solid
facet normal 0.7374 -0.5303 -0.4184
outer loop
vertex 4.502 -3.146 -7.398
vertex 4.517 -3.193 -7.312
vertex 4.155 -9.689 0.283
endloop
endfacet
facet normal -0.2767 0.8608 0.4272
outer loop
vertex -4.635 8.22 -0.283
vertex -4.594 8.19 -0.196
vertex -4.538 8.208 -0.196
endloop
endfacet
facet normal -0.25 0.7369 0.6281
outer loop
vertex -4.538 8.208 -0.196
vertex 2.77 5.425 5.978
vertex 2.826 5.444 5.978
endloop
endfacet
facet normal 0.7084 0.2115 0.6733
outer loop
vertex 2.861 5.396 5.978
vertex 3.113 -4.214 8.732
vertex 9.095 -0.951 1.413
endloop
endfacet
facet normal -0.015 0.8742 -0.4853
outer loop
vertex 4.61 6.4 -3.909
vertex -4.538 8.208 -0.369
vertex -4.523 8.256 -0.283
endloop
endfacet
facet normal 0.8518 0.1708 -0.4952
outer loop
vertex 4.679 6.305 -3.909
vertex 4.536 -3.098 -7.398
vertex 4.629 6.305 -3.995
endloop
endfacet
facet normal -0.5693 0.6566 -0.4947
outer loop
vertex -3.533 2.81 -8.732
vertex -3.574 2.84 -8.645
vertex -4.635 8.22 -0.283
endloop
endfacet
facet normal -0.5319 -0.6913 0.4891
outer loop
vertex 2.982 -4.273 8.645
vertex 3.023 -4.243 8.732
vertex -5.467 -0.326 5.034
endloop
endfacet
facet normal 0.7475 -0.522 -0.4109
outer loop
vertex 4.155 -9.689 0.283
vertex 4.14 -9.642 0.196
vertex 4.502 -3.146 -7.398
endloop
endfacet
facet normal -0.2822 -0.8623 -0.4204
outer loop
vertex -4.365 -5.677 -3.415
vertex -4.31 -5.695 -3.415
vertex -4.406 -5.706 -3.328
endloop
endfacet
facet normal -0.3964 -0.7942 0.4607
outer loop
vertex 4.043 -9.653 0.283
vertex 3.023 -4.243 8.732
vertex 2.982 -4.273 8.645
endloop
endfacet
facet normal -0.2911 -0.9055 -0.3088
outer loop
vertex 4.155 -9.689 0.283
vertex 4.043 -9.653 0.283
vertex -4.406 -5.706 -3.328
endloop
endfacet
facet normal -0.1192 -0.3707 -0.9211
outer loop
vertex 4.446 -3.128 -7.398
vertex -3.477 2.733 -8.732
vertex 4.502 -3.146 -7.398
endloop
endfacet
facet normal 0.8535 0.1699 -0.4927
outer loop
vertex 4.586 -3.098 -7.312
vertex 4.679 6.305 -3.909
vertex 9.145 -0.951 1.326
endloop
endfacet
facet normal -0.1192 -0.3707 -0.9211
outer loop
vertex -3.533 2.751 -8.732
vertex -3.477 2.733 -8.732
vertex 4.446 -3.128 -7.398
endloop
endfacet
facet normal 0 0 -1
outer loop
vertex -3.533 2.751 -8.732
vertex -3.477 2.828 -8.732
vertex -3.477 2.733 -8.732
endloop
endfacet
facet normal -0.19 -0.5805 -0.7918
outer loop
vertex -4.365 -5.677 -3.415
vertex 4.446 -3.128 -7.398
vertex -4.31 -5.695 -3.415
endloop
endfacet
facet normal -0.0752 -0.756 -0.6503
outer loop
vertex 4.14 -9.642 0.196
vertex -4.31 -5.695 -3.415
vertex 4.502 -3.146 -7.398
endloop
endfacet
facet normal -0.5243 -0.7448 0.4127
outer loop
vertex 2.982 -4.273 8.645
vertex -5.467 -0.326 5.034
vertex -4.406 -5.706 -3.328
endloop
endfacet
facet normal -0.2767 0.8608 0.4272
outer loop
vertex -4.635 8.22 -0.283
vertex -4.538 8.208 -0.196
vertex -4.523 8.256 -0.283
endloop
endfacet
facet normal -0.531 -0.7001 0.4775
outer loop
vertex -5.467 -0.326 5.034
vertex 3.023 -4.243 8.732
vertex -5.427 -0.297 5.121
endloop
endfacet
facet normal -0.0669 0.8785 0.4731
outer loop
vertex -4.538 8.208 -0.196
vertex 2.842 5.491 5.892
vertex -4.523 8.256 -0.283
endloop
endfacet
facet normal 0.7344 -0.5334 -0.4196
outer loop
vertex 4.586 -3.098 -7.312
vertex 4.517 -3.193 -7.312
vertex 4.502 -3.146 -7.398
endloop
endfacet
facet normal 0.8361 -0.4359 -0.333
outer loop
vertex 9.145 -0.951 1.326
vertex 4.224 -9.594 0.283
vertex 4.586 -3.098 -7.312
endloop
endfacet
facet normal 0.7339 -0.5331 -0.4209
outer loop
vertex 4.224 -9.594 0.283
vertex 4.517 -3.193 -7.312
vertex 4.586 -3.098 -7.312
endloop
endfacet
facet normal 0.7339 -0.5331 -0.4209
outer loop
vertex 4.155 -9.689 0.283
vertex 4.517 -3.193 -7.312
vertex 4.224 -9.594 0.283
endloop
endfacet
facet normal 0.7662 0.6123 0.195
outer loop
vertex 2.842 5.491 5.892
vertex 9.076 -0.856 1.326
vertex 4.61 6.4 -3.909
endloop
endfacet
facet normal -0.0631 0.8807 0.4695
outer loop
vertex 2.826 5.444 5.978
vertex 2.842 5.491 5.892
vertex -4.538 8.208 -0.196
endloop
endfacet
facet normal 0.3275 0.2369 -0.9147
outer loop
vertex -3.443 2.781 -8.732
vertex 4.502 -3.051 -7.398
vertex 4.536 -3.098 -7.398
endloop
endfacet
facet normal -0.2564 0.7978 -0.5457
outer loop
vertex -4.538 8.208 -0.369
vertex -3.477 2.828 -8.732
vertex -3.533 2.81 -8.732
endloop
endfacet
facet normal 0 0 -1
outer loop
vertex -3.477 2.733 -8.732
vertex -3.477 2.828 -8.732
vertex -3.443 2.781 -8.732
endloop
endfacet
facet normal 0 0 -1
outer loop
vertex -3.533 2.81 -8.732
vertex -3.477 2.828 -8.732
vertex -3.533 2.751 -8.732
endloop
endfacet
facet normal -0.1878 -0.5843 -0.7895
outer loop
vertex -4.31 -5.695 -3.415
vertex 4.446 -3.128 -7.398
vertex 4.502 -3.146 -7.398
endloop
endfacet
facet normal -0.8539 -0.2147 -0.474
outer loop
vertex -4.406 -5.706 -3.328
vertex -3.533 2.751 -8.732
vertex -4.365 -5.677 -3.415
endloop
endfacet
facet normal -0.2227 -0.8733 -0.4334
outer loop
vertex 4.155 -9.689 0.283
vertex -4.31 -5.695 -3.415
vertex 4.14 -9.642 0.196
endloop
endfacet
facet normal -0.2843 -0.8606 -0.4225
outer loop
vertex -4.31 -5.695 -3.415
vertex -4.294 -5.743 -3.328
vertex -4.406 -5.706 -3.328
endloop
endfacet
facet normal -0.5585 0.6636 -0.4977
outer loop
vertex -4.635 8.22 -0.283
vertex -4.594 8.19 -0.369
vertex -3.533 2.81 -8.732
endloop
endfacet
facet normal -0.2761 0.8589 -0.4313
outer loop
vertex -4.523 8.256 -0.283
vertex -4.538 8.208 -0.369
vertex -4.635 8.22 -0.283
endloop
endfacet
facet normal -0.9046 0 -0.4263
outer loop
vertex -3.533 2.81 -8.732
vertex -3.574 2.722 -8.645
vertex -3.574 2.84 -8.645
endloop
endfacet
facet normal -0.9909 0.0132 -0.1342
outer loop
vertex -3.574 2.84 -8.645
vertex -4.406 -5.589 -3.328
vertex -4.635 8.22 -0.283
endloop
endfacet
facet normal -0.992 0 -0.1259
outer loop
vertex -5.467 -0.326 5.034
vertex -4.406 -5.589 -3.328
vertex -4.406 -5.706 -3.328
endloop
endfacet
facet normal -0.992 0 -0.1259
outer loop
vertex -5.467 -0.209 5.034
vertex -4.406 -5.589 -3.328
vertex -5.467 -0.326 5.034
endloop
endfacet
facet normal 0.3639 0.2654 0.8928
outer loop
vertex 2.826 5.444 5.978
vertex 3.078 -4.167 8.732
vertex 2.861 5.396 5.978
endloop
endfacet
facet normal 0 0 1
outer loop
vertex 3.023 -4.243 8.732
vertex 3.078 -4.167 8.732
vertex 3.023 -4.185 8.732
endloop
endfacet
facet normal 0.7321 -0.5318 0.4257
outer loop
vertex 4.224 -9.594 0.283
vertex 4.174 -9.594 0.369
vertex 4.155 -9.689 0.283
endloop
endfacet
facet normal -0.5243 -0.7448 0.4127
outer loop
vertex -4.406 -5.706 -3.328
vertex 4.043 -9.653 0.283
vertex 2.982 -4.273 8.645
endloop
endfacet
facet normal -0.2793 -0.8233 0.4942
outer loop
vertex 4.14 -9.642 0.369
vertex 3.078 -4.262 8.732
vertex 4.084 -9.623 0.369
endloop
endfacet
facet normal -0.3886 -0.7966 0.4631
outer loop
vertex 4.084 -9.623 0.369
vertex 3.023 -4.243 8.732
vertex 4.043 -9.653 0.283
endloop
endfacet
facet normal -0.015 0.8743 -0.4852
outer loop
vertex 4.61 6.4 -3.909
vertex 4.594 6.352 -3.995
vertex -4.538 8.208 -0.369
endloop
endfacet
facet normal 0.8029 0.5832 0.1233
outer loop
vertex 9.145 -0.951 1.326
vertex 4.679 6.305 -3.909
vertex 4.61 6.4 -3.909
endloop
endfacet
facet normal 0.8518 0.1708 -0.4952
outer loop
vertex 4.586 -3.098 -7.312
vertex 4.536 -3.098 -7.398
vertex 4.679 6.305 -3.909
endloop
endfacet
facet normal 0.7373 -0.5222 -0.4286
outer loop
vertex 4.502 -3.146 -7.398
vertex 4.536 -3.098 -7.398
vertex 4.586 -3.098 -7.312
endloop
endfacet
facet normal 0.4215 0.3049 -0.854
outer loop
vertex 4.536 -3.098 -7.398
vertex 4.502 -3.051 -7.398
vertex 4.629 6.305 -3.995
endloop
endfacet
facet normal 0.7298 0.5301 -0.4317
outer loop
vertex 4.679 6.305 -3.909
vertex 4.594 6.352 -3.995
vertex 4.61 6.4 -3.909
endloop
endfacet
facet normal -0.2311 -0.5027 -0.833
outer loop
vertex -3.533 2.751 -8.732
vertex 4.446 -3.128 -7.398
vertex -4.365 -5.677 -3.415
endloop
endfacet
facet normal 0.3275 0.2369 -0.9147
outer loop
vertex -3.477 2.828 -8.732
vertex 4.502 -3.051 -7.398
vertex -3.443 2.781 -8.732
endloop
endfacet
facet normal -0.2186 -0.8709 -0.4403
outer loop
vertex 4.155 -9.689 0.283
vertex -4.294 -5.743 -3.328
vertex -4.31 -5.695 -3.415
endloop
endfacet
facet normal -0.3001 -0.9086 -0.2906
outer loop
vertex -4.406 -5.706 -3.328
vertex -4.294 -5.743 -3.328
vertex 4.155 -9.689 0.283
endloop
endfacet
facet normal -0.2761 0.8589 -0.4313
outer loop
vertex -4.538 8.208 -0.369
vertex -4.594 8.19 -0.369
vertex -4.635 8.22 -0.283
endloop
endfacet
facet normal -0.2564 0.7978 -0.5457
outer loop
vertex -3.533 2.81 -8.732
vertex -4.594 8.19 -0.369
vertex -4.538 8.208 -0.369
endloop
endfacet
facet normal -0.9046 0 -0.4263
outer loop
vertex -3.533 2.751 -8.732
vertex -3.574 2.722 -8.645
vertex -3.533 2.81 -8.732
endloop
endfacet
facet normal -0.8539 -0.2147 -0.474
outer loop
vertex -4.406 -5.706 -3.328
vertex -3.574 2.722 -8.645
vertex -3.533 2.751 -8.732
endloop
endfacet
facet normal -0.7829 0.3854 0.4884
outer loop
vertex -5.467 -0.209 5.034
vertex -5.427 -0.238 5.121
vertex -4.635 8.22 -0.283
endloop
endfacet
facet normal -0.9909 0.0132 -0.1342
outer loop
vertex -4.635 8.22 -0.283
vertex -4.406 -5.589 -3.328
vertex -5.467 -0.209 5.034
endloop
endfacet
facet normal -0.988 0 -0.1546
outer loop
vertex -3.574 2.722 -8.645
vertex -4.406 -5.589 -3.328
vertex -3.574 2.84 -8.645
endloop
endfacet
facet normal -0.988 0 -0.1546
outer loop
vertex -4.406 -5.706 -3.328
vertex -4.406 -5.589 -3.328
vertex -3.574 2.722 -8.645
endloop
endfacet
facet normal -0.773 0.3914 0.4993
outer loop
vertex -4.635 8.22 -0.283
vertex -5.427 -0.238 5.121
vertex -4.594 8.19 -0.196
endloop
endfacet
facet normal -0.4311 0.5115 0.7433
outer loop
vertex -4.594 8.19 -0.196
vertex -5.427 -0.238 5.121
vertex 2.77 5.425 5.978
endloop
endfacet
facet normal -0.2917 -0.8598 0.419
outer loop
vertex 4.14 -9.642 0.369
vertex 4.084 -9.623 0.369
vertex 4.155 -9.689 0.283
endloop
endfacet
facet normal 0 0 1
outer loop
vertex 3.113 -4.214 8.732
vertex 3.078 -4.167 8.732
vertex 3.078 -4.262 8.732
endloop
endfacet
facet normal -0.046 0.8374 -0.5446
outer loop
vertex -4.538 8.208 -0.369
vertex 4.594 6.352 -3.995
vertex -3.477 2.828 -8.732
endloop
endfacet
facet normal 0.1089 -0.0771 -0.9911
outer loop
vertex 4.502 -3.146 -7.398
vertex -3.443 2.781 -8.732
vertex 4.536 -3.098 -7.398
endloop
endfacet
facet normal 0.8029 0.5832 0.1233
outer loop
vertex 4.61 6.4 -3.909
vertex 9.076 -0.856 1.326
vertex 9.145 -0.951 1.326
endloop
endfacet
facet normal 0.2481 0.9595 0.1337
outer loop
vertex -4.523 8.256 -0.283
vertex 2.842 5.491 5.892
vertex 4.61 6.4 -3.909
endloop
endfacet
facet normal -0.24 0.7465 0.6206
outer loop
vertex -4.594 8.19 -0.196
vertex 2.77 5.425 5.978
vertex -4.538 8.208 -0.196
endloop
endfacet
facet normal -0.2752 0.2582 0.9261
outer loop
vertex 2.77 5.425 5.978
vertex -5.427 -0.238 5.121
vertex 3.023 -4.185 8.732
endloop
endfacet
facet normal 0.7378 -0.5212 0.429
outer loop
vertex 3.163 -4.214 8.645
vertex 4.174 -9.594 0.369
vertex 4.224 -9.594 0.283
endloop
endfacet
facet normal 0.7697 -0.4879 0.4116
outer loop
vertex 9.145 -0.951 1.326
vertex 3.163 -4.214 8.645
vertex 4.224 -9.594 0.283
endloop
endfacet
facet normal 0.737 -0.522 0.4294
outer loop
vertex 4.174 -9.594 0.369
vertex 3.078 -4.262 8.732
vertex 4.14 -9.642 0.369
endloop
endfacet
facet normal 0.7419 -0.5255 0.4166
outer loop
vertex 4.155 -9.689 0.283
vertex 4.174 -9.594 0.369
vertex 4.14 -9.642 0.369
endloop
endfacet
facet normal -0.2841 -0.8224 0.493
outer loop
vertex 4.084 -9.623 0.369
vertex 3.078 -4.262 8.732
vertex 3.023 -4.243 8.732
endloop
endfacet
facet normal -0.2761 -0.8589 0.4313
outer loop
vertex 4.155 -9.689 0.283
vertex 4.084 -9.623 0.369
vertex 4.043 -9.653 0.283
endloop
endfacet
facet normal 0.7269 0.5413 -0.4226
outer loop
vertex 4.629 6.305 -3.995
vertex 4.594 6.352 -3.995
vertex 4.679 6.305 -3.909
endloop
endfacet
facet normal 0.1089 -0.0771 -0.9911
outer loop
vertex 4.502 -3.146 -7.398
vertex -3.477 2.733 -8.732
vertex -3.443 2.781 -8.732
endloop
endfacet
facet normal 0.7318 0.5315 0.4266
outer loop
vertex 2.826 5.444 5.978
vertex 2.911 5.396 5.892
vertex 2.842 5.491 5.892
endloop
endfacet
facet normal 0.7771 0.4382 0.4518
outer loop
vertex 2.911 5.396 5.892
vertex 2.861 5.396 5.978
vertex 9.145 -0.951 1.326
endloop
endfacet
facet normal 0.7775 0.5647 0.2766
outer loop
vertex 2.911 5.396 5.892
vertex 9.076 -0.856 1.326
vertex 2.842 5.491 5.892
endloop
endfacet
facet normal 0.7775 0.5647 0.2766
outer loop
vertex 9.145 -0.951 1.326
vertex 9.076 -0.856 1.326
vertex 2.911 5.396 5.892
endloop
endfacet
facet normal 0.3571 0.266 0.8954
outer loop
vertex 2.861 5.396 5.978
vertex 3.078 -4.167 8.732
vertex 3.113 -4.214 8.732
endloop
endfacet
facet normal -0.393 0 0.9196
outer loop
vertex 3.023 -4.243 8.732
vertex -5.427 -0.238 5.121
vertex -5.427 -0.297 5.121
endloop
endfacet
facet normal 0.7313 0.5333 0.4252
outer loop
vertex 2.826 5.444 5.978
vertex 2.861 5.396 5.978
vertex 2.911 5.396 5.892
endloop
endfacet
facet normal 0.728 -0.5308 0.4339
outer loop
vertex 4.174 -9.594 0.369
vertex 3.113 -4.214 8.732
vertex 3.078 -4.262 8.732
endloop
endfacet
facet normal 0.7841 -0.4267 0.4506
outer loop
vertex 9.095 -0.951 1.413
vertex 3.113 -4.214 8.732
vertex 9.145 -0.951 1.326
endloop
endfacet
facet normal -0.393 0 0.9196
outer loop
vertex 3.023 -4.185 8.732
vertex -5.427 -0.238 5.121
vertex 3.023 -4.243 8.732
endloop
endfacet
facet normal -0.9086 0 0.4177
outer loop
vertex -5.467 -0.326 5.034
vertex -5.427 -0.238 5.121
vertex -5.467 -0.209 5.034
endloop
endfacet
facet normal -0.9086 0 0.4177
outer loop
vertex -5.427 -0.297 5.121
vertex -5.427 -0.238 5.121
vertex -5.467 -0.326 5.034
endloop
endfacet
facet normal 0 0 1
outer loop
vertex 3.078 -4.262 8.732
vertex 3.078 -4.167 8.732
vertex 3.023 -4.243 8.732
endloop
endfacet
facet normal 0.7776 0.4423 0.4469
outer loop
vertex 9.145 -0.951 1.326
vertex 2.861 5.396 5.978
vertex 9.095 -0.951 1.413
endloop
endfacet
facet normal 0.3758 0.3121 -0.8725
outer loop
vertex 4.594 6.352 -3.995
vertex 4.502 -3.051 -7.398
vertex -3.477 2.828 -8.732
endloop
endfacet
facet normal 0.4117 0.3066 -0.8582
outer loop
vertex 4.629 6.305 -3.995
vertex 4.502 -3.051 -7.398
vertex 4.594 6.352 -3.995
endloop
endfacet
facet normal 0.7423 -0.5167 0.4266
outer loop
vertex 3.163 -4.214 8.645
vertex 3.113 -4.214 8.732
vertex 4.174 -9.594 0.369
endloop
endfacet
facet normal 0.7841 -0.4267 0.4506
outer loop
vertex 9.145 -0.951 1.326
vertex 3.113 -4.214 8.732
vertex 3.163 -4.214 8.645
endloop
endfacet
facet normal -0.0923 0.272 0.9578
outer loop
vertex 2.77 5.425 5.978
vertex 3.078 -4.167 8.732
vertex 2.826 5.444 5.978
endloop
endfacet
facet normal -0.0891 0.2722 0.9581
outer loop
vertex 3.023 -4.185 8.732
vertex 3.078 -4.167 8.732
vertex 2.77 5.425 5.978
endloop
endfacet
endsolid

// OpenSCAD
// Auto-generated OpenSCAD file

    inner_points = 10*[[-0.4553770683985672, 0.816075390462194, -0.02826725120202972], [-0.3492651290097586, 0.27808264626453244, -0.8645112727111914], [0.3062996757811438, -0.4214091552352098, 0.8645112727111914], [0.4124116151699524, -0.9594018994328712, 0.02826725120202972], [0.45789115536956515, 0.630471121507822, -0.3908857929250278], [0.9045034915748815, -0.09513310390029023, 0.13259861870450954], [-0.5386073879474271, -0.026770981308893688, 0.5034118884114294], [-0.43249544855861854, -0.5647637255065552, -0.33283213309773235], [0.28106973038452526, 0.5396015179782265, 0.5891534403817997], [0.44860512332870417, -0.3098111524472321, -0.7311548260368412]];

    outer_points = 10*[[-0.8336003958246909, -0.4282242422434667, 0.3144481157395024], [-0.5192798779886039, 0.4282242422434667, 0.7239583176726031], [0.5192798779886039, -0.4282242422434667, -0.7239583176726031], [0.8336003958246909, 0.4282242422434667, -0.3144481157395024], [0.015816542021752034, -0.40830815643207485, 0.8417945059096876], [0.8090835339719289, -0.40830815643207485, 0.2329205620737586], [-0.42955329110383256, -0.15856661937867184, -0.559640382982223], [-0.11523277326774545, 0.6978818651082617, -0.15013018104912235], [-0.02137609852116739, -0.9005841684864844, -0.02784969457994478], [0.47489050229114943, 0.45162402044515604, 0.6187076390309791]];

    // Convex hull for inner set (I)
    module inner_hull() {
        hull() {
            for (p = inner_points) {
                translate(p) sphere(r=0.1);
            }
        }
    }

    // Convex hull for outer set (O) minus inner hull (O \ I)
    module outer_minus_inner() {
        difference() {
            hull() {
                for (p = outer_points) {
                    translate(p) sphere(r=0.1);
                }
            }
            inner_hull(); // Subtract inner hull
        }
    }

    // Convex hull for outer set (O) minus all translated inner hulls
    module outer_minus_AllTranslationInner() {
        difference() {
            hull() {
                for (p = outer_points) {
                    translate(p) sphere(r=0.1);
                }
            }
            hull() {
                translate([0,0,50]) inner_hull();
                translate([0,0,-50]) inner_hull();
            }; // Subtract translated inner hulls
        }
    }

    // Difference between outer_minus_inner and outer_minus_AllTranslationInner
    module outer_minus_inner_diff() {
        difference() {
            // Outer minus inner
            difference() {
                hull() {
                    for (p = outer_points) {
                        translate(p) sphere(r=0.1);
                    }
                }
                inner_hull();
            }

            // Subtract Outer minus AllTranslationInner
            difference() {
                hull() {
                    for (p = outer_points) {
                        translate(p) sphere(r=0.1);
                    }
                }
                hull() {
                    translate([0,0,50]) inner_hull();
                    translate([0,0,-50]) inner_hull();
                };
            }
        }
    }

    // Rendering all with colors applied
    color([1, 0, 0, 0.5]) inner_hull(); // Transparent red
    
